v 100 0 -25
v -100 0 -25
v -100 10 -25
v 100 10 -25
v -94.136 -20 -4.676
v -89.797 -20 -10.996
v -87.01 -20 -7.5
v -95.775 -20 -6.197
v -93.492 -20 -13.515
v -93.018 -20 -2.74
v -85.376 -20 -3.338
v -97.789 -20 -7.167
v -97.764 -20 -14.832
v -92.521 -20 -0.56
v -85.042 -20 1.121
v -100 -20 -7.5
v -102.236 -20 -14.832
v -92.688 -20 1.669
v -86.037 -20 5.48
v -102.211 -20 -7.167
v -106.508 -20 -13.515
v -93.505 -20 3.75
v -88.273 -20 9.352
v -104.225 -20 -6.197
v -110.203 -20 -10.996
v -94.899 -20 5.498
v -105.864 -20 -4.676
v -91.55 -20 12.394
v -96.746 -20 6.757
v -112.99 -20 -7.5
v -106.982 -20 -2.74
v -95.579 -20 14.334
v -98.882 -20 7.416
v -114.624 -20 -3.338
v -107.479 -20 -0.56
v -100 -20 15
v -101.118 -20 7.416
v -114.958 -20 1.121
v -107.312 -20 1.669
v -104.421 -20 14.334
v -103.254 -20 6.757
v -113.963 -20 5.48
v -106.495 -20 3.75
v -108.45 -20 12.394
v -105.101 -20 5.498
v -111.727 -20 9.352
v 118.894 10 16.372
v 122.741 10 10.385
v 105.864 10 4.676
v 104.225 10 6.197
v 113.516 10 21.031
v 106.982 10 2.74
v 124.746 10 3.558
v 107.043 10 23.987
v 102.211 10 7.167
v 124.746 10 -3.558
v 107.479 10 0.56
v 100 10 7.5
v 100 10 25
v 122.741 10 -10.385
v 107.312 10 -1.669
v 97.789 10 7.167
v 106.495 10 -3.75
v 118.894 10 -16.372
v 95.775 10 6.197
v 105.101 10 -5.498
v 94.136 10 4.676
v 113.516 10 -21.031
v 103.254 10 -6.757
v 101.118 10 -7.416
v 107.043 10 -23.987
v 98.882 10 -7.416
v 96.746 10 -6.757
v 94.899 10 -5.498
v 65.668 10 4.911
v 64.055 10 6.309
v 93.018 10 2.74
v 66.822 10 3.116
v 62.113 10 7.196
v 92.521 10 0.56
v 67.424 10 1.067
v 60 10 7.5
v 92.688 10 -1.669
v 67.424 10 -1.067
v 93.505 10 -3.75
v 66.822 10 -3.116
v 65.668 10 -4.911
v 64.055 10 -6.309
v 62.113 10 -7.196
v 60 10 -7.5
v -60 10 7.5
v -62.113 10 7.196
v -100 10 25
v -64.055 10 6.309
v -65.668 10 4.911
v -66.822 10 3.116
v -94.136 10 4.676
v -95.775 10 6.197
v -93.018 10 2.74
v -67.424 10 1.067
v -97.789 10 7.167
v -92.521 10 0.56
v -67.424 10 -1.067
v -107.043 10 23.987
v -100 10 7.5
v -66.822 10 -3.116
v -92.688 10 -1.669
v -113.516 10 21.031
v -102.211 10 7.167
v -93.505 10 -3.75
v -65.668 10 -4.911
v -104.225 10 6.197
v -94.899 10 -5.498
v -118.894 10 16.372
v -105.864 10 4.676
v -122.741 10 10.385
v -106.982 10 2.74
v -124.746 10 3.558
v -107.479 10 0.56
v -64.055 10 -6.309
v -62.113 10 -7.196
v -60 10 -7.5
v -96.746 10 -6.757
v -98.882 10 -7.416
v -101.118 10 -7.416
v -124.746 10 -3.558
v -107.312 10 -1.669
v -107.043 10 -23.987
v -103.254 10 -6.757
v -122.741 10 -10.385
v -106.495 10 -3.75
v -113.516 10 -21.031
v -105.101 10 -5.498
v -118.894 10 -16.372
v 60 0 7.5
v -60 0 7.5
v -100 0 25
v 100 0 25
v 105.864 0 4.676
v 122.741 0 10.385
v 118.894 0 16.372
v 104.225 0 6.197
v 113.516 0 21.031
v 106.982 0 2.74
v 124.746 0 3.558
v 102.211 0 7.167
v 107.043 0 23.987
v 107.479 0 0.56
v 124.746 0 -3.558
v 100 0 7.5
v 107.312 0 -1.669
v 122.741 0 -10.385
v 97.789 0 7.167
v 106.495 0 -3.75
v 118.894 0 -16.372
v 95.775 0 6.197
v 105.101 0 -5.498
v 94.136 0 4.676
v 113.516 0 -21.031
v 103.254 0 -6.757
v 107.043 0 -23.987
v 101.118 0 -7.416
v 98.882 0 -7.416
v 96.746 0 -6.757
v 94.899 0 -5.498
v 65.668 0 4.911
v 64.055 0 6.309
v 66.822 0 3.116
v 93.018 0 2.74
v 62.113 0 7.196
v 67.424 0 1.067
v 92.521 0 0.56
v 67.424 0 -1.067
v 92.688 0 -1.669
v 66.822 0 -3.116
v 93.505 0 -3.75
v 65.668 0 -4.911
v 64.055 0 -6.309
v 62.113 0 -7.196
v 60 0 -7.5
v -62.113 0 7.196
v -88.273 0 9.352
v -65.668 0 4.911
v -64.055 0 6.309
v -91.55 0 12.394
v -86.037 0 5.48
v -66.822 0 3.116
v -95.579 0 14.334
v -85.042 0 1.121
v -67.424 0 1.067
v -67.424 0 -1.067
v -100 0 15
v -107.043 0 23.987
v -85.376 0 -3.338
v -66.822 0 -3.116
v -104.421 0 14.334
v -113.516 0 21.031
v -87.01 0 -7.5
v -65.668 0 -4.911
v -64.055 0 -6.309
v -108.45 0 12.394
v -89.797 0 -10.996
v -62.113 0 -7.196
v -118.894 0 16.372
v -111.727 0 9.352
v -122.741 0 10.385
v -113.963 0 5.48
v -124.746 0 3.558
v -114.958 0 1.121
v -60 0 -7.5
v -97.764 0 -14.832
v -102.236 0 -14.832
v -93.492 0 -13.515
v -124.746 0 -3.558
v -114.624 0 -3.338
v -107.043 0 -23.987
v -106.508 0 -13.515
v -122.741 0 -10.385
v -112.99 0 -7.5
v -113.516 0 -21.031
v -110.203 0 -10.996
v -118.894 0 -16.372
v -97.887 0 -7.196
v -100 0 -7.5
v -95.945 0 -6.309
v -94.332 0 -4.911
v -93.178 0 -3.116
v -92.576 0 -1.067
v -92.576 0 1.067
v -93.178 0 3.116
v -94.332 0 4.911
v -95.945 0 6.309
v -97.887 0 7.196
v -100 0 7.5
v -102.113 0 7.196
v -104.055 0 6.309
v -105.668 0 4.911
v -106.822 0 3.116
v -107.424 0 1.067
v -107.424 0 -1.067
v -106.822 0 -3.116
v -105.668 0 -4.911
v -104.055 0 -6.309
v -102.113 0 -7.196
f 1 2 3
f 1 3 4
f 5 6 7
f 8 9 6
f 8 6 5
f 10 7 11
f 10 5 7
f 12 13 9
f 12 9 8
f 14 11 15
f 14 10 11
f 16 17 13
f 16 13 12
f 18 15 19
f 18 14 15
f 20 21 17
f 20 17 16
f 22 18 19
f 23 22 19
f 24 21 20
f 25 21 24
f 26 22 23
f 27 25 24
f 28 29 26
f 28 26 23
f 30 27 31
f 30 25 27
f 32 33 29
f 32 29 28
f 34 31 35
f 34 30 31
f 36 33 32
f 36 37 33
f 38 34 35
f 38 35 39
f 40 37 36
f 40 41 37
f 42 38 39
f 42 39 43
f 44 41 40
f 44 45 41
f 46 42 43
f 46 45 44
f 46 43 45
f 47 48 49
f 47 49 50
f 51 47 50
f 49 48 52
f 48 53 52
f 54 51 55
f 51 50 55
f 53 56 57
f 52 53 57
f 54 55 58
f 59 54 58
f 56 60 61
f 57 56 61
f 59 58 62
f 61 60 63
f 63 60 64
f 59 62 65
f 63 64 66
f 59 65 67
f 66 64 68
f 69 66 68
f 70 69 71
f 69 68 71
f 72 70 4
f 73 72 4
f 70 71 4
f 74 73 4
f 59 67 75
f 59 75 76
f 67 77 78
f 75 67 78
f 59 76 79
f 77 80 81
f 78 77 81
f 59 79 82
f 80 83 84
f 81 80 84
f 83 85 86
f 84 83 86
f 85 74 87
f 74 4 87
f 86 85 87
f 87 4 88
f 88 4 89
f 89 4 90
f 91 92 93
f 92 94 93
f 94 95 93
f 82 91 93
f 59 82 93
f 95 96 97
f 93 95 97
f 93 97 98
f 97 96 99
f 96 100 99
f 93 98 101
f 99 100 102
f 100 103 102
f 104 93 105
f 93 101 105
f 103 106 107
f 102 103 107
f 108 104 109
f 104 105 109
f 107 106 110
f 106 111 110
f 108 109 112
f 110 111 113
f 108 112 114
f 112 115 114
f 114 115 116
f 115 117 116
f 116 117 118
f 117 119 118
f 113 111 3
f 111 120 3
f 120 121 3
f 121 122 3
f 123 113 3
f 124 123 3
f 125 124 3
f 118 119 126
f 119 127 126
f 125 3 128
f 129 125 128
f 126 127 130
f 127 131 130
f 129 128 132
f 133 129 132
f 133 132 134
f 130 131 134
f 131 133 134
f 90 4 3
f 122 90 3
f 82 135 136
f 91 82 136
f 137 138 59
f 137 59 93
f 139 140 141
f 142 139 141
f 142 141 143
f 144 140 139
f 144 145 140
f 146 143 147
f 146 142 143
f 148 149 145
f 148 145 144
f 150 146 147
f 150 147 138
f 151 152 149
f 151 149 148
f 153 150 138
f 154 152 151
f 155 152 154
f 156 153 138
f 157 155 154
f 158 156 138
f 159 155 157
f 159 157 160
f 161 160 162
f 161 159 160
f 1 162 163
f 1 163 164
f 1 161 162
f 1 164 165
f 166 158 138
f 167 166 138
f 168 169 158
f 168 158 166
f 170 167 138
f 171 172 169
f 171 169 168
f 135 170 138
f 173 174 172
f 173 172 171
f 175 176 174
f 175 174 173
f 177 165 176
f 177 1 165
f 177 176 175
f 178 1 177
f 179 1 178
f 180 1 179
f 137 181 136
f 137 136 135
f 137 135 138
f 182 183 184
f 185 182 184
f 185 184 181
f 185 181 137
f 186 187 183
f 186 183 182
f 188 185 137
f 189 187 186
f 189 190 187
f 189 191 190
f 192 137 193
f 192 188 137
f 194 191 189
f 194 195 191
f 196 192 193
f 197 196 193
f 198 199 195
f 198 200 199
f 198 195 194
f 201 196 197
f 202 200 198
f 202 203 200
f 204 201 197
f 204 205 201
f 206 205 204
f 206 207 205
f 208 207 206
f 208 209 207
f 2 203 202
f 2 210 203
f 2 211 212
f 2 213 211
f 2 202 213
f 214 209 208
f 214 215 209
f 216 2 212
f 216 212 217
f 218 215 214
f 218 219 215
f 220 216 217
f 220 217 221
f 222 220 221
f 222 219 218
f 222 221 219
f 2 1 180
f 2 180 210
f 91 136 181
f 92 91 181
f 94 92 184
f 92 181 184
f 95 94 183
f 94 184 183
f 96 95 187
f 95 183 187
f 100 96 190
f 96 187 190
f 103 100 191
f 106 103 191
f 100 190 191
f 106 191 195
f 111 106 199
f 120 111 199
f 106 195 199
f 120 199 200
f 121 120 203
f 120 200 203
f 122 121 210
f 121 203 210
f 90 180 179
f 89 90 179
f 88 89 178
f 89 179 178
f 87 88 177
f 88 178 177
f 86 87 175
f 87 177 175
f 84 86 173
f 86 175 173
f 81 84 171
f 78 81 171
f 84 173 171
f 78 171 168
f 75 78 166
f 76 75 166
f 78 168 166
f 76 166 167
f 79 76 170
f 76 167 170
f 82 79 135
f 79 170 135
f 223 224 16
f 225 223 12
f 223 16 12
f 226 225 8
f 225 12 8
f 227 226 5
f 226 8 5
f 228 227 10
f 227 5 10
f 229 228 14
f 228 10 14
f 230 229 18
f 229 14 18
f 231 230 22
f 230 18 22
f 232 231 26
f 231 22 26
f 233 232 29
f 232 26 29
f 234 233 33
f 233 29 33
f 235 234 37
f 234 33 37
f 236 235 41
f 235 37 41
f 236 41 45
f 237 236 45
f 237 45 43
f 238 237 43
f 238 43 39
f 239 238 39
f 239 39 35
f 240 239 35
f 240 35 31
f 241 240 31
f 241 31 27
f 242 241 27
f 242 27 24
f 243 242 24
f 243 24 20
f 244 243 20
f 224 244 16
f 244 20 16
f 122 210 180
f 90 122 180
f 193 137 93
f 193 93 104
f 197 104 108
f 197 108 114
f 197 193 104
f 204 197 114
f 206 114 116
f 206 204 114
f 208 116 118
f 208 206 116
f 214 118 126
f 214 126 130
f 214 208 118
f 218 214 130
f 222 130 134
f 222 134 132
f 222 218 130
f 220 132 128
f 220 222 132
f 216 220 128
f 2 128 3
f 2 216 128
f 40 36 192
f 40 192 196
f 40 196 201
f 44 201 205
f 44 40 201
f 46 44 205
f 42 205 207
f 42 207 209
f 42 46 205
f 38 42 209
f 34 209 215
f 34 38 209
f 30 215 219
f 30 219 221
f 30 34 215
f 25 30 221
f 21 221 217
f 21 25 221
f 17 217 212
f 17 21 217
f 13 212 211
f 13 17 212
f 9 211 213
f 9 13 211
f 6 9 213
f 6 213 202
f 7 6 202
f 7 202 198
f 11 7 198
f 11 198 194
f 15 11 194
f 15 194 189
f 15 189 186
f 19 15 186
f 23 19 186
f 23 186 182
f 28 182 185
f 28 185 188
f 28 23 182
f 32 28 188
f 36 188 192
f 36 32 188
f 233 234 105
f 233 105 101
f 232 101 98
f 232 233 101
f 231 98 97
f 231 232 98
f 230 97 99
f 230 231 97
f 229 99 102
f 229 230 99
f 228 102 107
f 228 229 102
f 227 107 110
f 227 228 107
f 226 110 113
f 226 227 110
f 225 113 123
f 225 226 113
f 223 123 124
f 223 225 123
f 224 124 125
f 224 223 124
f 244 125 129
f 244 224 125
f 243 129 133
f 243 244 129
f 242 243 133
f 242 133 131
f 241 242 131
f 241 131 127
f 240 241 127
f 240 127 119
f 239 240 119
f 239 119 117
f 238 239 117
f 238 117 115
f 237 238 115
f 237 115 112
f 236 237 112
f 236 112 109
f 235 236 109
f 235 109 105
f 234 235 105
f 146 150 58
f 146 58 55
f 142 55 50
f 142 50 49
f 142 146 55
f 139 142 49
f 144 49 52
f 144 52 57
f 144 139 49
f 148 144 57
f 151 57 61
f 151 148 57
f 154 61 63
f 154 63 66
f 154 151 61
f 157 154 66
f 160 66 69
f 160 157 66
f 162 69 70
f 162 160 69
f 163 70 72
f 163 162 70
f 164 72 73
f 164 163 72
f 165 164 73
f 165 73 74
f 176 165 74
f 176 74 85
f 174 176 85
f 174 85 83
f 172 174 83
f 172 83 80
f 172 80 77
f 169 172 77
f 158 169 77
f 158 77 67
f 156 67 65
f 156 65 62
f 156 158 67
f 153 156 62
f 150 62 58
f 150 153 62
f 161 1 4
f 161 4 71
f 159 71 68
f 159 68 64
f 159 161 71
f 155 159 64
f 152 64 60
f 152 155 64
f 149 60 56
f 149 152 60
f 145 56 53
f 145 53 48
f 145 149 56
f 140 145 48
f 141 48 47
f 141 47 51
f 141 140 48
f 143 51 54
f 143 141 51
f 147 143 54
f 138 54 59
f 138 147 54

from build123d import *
from build123d.topology import SkipClean

# Parameters (mm, degrees)
SKETCH2_R           = 7.5
BOSS_EXTRUDE1_DEPTH = 10
BOSS_EXTRUDE2_START = 20
SKETCH3_R           = 15
SKETCH3_R_2         = 7.5
BOSS_EXTRUDE2_DEPTH = 20


with BuildPart() as part:
    # Sketch2 → Boss-Extrude1 (new body)
    with BuildSketch(Plane(origin=(0, 0, 0), x_dir=(1, 0, 0), z_dir=(0, 1, 0))):
        with BuildLine():
            Line((-100, 25), (100, 25))
            ThreePointArc((100, 25), (125, 0), (100, -25))
            Line((100, -25), (-100, -25))
            ThreePointArc((-100, -25), (-125, 0), (-100, 25))
        make_face()
        with Locations(Location((100, 0, 0), (0, 0, 270))):
            Circle(SKETCH2_R, mode=Mode.SUBTRACT)
        with Locations(Location((-100, 0, 0), (0, 0, 270))):
            Circle(SKETCH2_R, mode=Mode.SUBTRACT)
        with BuildLine():
            Line((-60, 7.5), (60, 7.5))
            ThreePointArc((60, 7.5), (67.5, 0), (60, -7.5))
            Line((60, -7.5), (-60, -7.5))
            ThreePointArc((-60, -7.5), (-67.5, 0), (-60, 7.5))
        make_face(mode=Mode.SUBTRACT)
    extrude(amount=BOSS_EXTRUDE1_DEPTH)

    # Sketch3 → Boss-Extrude2 (add)
    with SkipClean():  # the faces are left unmerged after this step: merging them gives an invalid solid
        with BuildSketch(Plane.XZ.offset(BOSS_EXTRUDE2_START)):
            with Locations(Location((-100, 0, 0), (0, 0, 90))):
                Circle(SKETCH3_R)
            with Locations(Location((-100, 0, 0), (0, 0, 270))):
                Circle(SKETCH3_R_2, mode=Mode.SUBTRACT)
        extrude(amount=-BOSS_EXTRUDE2_DEPTH)


solid = part.part
